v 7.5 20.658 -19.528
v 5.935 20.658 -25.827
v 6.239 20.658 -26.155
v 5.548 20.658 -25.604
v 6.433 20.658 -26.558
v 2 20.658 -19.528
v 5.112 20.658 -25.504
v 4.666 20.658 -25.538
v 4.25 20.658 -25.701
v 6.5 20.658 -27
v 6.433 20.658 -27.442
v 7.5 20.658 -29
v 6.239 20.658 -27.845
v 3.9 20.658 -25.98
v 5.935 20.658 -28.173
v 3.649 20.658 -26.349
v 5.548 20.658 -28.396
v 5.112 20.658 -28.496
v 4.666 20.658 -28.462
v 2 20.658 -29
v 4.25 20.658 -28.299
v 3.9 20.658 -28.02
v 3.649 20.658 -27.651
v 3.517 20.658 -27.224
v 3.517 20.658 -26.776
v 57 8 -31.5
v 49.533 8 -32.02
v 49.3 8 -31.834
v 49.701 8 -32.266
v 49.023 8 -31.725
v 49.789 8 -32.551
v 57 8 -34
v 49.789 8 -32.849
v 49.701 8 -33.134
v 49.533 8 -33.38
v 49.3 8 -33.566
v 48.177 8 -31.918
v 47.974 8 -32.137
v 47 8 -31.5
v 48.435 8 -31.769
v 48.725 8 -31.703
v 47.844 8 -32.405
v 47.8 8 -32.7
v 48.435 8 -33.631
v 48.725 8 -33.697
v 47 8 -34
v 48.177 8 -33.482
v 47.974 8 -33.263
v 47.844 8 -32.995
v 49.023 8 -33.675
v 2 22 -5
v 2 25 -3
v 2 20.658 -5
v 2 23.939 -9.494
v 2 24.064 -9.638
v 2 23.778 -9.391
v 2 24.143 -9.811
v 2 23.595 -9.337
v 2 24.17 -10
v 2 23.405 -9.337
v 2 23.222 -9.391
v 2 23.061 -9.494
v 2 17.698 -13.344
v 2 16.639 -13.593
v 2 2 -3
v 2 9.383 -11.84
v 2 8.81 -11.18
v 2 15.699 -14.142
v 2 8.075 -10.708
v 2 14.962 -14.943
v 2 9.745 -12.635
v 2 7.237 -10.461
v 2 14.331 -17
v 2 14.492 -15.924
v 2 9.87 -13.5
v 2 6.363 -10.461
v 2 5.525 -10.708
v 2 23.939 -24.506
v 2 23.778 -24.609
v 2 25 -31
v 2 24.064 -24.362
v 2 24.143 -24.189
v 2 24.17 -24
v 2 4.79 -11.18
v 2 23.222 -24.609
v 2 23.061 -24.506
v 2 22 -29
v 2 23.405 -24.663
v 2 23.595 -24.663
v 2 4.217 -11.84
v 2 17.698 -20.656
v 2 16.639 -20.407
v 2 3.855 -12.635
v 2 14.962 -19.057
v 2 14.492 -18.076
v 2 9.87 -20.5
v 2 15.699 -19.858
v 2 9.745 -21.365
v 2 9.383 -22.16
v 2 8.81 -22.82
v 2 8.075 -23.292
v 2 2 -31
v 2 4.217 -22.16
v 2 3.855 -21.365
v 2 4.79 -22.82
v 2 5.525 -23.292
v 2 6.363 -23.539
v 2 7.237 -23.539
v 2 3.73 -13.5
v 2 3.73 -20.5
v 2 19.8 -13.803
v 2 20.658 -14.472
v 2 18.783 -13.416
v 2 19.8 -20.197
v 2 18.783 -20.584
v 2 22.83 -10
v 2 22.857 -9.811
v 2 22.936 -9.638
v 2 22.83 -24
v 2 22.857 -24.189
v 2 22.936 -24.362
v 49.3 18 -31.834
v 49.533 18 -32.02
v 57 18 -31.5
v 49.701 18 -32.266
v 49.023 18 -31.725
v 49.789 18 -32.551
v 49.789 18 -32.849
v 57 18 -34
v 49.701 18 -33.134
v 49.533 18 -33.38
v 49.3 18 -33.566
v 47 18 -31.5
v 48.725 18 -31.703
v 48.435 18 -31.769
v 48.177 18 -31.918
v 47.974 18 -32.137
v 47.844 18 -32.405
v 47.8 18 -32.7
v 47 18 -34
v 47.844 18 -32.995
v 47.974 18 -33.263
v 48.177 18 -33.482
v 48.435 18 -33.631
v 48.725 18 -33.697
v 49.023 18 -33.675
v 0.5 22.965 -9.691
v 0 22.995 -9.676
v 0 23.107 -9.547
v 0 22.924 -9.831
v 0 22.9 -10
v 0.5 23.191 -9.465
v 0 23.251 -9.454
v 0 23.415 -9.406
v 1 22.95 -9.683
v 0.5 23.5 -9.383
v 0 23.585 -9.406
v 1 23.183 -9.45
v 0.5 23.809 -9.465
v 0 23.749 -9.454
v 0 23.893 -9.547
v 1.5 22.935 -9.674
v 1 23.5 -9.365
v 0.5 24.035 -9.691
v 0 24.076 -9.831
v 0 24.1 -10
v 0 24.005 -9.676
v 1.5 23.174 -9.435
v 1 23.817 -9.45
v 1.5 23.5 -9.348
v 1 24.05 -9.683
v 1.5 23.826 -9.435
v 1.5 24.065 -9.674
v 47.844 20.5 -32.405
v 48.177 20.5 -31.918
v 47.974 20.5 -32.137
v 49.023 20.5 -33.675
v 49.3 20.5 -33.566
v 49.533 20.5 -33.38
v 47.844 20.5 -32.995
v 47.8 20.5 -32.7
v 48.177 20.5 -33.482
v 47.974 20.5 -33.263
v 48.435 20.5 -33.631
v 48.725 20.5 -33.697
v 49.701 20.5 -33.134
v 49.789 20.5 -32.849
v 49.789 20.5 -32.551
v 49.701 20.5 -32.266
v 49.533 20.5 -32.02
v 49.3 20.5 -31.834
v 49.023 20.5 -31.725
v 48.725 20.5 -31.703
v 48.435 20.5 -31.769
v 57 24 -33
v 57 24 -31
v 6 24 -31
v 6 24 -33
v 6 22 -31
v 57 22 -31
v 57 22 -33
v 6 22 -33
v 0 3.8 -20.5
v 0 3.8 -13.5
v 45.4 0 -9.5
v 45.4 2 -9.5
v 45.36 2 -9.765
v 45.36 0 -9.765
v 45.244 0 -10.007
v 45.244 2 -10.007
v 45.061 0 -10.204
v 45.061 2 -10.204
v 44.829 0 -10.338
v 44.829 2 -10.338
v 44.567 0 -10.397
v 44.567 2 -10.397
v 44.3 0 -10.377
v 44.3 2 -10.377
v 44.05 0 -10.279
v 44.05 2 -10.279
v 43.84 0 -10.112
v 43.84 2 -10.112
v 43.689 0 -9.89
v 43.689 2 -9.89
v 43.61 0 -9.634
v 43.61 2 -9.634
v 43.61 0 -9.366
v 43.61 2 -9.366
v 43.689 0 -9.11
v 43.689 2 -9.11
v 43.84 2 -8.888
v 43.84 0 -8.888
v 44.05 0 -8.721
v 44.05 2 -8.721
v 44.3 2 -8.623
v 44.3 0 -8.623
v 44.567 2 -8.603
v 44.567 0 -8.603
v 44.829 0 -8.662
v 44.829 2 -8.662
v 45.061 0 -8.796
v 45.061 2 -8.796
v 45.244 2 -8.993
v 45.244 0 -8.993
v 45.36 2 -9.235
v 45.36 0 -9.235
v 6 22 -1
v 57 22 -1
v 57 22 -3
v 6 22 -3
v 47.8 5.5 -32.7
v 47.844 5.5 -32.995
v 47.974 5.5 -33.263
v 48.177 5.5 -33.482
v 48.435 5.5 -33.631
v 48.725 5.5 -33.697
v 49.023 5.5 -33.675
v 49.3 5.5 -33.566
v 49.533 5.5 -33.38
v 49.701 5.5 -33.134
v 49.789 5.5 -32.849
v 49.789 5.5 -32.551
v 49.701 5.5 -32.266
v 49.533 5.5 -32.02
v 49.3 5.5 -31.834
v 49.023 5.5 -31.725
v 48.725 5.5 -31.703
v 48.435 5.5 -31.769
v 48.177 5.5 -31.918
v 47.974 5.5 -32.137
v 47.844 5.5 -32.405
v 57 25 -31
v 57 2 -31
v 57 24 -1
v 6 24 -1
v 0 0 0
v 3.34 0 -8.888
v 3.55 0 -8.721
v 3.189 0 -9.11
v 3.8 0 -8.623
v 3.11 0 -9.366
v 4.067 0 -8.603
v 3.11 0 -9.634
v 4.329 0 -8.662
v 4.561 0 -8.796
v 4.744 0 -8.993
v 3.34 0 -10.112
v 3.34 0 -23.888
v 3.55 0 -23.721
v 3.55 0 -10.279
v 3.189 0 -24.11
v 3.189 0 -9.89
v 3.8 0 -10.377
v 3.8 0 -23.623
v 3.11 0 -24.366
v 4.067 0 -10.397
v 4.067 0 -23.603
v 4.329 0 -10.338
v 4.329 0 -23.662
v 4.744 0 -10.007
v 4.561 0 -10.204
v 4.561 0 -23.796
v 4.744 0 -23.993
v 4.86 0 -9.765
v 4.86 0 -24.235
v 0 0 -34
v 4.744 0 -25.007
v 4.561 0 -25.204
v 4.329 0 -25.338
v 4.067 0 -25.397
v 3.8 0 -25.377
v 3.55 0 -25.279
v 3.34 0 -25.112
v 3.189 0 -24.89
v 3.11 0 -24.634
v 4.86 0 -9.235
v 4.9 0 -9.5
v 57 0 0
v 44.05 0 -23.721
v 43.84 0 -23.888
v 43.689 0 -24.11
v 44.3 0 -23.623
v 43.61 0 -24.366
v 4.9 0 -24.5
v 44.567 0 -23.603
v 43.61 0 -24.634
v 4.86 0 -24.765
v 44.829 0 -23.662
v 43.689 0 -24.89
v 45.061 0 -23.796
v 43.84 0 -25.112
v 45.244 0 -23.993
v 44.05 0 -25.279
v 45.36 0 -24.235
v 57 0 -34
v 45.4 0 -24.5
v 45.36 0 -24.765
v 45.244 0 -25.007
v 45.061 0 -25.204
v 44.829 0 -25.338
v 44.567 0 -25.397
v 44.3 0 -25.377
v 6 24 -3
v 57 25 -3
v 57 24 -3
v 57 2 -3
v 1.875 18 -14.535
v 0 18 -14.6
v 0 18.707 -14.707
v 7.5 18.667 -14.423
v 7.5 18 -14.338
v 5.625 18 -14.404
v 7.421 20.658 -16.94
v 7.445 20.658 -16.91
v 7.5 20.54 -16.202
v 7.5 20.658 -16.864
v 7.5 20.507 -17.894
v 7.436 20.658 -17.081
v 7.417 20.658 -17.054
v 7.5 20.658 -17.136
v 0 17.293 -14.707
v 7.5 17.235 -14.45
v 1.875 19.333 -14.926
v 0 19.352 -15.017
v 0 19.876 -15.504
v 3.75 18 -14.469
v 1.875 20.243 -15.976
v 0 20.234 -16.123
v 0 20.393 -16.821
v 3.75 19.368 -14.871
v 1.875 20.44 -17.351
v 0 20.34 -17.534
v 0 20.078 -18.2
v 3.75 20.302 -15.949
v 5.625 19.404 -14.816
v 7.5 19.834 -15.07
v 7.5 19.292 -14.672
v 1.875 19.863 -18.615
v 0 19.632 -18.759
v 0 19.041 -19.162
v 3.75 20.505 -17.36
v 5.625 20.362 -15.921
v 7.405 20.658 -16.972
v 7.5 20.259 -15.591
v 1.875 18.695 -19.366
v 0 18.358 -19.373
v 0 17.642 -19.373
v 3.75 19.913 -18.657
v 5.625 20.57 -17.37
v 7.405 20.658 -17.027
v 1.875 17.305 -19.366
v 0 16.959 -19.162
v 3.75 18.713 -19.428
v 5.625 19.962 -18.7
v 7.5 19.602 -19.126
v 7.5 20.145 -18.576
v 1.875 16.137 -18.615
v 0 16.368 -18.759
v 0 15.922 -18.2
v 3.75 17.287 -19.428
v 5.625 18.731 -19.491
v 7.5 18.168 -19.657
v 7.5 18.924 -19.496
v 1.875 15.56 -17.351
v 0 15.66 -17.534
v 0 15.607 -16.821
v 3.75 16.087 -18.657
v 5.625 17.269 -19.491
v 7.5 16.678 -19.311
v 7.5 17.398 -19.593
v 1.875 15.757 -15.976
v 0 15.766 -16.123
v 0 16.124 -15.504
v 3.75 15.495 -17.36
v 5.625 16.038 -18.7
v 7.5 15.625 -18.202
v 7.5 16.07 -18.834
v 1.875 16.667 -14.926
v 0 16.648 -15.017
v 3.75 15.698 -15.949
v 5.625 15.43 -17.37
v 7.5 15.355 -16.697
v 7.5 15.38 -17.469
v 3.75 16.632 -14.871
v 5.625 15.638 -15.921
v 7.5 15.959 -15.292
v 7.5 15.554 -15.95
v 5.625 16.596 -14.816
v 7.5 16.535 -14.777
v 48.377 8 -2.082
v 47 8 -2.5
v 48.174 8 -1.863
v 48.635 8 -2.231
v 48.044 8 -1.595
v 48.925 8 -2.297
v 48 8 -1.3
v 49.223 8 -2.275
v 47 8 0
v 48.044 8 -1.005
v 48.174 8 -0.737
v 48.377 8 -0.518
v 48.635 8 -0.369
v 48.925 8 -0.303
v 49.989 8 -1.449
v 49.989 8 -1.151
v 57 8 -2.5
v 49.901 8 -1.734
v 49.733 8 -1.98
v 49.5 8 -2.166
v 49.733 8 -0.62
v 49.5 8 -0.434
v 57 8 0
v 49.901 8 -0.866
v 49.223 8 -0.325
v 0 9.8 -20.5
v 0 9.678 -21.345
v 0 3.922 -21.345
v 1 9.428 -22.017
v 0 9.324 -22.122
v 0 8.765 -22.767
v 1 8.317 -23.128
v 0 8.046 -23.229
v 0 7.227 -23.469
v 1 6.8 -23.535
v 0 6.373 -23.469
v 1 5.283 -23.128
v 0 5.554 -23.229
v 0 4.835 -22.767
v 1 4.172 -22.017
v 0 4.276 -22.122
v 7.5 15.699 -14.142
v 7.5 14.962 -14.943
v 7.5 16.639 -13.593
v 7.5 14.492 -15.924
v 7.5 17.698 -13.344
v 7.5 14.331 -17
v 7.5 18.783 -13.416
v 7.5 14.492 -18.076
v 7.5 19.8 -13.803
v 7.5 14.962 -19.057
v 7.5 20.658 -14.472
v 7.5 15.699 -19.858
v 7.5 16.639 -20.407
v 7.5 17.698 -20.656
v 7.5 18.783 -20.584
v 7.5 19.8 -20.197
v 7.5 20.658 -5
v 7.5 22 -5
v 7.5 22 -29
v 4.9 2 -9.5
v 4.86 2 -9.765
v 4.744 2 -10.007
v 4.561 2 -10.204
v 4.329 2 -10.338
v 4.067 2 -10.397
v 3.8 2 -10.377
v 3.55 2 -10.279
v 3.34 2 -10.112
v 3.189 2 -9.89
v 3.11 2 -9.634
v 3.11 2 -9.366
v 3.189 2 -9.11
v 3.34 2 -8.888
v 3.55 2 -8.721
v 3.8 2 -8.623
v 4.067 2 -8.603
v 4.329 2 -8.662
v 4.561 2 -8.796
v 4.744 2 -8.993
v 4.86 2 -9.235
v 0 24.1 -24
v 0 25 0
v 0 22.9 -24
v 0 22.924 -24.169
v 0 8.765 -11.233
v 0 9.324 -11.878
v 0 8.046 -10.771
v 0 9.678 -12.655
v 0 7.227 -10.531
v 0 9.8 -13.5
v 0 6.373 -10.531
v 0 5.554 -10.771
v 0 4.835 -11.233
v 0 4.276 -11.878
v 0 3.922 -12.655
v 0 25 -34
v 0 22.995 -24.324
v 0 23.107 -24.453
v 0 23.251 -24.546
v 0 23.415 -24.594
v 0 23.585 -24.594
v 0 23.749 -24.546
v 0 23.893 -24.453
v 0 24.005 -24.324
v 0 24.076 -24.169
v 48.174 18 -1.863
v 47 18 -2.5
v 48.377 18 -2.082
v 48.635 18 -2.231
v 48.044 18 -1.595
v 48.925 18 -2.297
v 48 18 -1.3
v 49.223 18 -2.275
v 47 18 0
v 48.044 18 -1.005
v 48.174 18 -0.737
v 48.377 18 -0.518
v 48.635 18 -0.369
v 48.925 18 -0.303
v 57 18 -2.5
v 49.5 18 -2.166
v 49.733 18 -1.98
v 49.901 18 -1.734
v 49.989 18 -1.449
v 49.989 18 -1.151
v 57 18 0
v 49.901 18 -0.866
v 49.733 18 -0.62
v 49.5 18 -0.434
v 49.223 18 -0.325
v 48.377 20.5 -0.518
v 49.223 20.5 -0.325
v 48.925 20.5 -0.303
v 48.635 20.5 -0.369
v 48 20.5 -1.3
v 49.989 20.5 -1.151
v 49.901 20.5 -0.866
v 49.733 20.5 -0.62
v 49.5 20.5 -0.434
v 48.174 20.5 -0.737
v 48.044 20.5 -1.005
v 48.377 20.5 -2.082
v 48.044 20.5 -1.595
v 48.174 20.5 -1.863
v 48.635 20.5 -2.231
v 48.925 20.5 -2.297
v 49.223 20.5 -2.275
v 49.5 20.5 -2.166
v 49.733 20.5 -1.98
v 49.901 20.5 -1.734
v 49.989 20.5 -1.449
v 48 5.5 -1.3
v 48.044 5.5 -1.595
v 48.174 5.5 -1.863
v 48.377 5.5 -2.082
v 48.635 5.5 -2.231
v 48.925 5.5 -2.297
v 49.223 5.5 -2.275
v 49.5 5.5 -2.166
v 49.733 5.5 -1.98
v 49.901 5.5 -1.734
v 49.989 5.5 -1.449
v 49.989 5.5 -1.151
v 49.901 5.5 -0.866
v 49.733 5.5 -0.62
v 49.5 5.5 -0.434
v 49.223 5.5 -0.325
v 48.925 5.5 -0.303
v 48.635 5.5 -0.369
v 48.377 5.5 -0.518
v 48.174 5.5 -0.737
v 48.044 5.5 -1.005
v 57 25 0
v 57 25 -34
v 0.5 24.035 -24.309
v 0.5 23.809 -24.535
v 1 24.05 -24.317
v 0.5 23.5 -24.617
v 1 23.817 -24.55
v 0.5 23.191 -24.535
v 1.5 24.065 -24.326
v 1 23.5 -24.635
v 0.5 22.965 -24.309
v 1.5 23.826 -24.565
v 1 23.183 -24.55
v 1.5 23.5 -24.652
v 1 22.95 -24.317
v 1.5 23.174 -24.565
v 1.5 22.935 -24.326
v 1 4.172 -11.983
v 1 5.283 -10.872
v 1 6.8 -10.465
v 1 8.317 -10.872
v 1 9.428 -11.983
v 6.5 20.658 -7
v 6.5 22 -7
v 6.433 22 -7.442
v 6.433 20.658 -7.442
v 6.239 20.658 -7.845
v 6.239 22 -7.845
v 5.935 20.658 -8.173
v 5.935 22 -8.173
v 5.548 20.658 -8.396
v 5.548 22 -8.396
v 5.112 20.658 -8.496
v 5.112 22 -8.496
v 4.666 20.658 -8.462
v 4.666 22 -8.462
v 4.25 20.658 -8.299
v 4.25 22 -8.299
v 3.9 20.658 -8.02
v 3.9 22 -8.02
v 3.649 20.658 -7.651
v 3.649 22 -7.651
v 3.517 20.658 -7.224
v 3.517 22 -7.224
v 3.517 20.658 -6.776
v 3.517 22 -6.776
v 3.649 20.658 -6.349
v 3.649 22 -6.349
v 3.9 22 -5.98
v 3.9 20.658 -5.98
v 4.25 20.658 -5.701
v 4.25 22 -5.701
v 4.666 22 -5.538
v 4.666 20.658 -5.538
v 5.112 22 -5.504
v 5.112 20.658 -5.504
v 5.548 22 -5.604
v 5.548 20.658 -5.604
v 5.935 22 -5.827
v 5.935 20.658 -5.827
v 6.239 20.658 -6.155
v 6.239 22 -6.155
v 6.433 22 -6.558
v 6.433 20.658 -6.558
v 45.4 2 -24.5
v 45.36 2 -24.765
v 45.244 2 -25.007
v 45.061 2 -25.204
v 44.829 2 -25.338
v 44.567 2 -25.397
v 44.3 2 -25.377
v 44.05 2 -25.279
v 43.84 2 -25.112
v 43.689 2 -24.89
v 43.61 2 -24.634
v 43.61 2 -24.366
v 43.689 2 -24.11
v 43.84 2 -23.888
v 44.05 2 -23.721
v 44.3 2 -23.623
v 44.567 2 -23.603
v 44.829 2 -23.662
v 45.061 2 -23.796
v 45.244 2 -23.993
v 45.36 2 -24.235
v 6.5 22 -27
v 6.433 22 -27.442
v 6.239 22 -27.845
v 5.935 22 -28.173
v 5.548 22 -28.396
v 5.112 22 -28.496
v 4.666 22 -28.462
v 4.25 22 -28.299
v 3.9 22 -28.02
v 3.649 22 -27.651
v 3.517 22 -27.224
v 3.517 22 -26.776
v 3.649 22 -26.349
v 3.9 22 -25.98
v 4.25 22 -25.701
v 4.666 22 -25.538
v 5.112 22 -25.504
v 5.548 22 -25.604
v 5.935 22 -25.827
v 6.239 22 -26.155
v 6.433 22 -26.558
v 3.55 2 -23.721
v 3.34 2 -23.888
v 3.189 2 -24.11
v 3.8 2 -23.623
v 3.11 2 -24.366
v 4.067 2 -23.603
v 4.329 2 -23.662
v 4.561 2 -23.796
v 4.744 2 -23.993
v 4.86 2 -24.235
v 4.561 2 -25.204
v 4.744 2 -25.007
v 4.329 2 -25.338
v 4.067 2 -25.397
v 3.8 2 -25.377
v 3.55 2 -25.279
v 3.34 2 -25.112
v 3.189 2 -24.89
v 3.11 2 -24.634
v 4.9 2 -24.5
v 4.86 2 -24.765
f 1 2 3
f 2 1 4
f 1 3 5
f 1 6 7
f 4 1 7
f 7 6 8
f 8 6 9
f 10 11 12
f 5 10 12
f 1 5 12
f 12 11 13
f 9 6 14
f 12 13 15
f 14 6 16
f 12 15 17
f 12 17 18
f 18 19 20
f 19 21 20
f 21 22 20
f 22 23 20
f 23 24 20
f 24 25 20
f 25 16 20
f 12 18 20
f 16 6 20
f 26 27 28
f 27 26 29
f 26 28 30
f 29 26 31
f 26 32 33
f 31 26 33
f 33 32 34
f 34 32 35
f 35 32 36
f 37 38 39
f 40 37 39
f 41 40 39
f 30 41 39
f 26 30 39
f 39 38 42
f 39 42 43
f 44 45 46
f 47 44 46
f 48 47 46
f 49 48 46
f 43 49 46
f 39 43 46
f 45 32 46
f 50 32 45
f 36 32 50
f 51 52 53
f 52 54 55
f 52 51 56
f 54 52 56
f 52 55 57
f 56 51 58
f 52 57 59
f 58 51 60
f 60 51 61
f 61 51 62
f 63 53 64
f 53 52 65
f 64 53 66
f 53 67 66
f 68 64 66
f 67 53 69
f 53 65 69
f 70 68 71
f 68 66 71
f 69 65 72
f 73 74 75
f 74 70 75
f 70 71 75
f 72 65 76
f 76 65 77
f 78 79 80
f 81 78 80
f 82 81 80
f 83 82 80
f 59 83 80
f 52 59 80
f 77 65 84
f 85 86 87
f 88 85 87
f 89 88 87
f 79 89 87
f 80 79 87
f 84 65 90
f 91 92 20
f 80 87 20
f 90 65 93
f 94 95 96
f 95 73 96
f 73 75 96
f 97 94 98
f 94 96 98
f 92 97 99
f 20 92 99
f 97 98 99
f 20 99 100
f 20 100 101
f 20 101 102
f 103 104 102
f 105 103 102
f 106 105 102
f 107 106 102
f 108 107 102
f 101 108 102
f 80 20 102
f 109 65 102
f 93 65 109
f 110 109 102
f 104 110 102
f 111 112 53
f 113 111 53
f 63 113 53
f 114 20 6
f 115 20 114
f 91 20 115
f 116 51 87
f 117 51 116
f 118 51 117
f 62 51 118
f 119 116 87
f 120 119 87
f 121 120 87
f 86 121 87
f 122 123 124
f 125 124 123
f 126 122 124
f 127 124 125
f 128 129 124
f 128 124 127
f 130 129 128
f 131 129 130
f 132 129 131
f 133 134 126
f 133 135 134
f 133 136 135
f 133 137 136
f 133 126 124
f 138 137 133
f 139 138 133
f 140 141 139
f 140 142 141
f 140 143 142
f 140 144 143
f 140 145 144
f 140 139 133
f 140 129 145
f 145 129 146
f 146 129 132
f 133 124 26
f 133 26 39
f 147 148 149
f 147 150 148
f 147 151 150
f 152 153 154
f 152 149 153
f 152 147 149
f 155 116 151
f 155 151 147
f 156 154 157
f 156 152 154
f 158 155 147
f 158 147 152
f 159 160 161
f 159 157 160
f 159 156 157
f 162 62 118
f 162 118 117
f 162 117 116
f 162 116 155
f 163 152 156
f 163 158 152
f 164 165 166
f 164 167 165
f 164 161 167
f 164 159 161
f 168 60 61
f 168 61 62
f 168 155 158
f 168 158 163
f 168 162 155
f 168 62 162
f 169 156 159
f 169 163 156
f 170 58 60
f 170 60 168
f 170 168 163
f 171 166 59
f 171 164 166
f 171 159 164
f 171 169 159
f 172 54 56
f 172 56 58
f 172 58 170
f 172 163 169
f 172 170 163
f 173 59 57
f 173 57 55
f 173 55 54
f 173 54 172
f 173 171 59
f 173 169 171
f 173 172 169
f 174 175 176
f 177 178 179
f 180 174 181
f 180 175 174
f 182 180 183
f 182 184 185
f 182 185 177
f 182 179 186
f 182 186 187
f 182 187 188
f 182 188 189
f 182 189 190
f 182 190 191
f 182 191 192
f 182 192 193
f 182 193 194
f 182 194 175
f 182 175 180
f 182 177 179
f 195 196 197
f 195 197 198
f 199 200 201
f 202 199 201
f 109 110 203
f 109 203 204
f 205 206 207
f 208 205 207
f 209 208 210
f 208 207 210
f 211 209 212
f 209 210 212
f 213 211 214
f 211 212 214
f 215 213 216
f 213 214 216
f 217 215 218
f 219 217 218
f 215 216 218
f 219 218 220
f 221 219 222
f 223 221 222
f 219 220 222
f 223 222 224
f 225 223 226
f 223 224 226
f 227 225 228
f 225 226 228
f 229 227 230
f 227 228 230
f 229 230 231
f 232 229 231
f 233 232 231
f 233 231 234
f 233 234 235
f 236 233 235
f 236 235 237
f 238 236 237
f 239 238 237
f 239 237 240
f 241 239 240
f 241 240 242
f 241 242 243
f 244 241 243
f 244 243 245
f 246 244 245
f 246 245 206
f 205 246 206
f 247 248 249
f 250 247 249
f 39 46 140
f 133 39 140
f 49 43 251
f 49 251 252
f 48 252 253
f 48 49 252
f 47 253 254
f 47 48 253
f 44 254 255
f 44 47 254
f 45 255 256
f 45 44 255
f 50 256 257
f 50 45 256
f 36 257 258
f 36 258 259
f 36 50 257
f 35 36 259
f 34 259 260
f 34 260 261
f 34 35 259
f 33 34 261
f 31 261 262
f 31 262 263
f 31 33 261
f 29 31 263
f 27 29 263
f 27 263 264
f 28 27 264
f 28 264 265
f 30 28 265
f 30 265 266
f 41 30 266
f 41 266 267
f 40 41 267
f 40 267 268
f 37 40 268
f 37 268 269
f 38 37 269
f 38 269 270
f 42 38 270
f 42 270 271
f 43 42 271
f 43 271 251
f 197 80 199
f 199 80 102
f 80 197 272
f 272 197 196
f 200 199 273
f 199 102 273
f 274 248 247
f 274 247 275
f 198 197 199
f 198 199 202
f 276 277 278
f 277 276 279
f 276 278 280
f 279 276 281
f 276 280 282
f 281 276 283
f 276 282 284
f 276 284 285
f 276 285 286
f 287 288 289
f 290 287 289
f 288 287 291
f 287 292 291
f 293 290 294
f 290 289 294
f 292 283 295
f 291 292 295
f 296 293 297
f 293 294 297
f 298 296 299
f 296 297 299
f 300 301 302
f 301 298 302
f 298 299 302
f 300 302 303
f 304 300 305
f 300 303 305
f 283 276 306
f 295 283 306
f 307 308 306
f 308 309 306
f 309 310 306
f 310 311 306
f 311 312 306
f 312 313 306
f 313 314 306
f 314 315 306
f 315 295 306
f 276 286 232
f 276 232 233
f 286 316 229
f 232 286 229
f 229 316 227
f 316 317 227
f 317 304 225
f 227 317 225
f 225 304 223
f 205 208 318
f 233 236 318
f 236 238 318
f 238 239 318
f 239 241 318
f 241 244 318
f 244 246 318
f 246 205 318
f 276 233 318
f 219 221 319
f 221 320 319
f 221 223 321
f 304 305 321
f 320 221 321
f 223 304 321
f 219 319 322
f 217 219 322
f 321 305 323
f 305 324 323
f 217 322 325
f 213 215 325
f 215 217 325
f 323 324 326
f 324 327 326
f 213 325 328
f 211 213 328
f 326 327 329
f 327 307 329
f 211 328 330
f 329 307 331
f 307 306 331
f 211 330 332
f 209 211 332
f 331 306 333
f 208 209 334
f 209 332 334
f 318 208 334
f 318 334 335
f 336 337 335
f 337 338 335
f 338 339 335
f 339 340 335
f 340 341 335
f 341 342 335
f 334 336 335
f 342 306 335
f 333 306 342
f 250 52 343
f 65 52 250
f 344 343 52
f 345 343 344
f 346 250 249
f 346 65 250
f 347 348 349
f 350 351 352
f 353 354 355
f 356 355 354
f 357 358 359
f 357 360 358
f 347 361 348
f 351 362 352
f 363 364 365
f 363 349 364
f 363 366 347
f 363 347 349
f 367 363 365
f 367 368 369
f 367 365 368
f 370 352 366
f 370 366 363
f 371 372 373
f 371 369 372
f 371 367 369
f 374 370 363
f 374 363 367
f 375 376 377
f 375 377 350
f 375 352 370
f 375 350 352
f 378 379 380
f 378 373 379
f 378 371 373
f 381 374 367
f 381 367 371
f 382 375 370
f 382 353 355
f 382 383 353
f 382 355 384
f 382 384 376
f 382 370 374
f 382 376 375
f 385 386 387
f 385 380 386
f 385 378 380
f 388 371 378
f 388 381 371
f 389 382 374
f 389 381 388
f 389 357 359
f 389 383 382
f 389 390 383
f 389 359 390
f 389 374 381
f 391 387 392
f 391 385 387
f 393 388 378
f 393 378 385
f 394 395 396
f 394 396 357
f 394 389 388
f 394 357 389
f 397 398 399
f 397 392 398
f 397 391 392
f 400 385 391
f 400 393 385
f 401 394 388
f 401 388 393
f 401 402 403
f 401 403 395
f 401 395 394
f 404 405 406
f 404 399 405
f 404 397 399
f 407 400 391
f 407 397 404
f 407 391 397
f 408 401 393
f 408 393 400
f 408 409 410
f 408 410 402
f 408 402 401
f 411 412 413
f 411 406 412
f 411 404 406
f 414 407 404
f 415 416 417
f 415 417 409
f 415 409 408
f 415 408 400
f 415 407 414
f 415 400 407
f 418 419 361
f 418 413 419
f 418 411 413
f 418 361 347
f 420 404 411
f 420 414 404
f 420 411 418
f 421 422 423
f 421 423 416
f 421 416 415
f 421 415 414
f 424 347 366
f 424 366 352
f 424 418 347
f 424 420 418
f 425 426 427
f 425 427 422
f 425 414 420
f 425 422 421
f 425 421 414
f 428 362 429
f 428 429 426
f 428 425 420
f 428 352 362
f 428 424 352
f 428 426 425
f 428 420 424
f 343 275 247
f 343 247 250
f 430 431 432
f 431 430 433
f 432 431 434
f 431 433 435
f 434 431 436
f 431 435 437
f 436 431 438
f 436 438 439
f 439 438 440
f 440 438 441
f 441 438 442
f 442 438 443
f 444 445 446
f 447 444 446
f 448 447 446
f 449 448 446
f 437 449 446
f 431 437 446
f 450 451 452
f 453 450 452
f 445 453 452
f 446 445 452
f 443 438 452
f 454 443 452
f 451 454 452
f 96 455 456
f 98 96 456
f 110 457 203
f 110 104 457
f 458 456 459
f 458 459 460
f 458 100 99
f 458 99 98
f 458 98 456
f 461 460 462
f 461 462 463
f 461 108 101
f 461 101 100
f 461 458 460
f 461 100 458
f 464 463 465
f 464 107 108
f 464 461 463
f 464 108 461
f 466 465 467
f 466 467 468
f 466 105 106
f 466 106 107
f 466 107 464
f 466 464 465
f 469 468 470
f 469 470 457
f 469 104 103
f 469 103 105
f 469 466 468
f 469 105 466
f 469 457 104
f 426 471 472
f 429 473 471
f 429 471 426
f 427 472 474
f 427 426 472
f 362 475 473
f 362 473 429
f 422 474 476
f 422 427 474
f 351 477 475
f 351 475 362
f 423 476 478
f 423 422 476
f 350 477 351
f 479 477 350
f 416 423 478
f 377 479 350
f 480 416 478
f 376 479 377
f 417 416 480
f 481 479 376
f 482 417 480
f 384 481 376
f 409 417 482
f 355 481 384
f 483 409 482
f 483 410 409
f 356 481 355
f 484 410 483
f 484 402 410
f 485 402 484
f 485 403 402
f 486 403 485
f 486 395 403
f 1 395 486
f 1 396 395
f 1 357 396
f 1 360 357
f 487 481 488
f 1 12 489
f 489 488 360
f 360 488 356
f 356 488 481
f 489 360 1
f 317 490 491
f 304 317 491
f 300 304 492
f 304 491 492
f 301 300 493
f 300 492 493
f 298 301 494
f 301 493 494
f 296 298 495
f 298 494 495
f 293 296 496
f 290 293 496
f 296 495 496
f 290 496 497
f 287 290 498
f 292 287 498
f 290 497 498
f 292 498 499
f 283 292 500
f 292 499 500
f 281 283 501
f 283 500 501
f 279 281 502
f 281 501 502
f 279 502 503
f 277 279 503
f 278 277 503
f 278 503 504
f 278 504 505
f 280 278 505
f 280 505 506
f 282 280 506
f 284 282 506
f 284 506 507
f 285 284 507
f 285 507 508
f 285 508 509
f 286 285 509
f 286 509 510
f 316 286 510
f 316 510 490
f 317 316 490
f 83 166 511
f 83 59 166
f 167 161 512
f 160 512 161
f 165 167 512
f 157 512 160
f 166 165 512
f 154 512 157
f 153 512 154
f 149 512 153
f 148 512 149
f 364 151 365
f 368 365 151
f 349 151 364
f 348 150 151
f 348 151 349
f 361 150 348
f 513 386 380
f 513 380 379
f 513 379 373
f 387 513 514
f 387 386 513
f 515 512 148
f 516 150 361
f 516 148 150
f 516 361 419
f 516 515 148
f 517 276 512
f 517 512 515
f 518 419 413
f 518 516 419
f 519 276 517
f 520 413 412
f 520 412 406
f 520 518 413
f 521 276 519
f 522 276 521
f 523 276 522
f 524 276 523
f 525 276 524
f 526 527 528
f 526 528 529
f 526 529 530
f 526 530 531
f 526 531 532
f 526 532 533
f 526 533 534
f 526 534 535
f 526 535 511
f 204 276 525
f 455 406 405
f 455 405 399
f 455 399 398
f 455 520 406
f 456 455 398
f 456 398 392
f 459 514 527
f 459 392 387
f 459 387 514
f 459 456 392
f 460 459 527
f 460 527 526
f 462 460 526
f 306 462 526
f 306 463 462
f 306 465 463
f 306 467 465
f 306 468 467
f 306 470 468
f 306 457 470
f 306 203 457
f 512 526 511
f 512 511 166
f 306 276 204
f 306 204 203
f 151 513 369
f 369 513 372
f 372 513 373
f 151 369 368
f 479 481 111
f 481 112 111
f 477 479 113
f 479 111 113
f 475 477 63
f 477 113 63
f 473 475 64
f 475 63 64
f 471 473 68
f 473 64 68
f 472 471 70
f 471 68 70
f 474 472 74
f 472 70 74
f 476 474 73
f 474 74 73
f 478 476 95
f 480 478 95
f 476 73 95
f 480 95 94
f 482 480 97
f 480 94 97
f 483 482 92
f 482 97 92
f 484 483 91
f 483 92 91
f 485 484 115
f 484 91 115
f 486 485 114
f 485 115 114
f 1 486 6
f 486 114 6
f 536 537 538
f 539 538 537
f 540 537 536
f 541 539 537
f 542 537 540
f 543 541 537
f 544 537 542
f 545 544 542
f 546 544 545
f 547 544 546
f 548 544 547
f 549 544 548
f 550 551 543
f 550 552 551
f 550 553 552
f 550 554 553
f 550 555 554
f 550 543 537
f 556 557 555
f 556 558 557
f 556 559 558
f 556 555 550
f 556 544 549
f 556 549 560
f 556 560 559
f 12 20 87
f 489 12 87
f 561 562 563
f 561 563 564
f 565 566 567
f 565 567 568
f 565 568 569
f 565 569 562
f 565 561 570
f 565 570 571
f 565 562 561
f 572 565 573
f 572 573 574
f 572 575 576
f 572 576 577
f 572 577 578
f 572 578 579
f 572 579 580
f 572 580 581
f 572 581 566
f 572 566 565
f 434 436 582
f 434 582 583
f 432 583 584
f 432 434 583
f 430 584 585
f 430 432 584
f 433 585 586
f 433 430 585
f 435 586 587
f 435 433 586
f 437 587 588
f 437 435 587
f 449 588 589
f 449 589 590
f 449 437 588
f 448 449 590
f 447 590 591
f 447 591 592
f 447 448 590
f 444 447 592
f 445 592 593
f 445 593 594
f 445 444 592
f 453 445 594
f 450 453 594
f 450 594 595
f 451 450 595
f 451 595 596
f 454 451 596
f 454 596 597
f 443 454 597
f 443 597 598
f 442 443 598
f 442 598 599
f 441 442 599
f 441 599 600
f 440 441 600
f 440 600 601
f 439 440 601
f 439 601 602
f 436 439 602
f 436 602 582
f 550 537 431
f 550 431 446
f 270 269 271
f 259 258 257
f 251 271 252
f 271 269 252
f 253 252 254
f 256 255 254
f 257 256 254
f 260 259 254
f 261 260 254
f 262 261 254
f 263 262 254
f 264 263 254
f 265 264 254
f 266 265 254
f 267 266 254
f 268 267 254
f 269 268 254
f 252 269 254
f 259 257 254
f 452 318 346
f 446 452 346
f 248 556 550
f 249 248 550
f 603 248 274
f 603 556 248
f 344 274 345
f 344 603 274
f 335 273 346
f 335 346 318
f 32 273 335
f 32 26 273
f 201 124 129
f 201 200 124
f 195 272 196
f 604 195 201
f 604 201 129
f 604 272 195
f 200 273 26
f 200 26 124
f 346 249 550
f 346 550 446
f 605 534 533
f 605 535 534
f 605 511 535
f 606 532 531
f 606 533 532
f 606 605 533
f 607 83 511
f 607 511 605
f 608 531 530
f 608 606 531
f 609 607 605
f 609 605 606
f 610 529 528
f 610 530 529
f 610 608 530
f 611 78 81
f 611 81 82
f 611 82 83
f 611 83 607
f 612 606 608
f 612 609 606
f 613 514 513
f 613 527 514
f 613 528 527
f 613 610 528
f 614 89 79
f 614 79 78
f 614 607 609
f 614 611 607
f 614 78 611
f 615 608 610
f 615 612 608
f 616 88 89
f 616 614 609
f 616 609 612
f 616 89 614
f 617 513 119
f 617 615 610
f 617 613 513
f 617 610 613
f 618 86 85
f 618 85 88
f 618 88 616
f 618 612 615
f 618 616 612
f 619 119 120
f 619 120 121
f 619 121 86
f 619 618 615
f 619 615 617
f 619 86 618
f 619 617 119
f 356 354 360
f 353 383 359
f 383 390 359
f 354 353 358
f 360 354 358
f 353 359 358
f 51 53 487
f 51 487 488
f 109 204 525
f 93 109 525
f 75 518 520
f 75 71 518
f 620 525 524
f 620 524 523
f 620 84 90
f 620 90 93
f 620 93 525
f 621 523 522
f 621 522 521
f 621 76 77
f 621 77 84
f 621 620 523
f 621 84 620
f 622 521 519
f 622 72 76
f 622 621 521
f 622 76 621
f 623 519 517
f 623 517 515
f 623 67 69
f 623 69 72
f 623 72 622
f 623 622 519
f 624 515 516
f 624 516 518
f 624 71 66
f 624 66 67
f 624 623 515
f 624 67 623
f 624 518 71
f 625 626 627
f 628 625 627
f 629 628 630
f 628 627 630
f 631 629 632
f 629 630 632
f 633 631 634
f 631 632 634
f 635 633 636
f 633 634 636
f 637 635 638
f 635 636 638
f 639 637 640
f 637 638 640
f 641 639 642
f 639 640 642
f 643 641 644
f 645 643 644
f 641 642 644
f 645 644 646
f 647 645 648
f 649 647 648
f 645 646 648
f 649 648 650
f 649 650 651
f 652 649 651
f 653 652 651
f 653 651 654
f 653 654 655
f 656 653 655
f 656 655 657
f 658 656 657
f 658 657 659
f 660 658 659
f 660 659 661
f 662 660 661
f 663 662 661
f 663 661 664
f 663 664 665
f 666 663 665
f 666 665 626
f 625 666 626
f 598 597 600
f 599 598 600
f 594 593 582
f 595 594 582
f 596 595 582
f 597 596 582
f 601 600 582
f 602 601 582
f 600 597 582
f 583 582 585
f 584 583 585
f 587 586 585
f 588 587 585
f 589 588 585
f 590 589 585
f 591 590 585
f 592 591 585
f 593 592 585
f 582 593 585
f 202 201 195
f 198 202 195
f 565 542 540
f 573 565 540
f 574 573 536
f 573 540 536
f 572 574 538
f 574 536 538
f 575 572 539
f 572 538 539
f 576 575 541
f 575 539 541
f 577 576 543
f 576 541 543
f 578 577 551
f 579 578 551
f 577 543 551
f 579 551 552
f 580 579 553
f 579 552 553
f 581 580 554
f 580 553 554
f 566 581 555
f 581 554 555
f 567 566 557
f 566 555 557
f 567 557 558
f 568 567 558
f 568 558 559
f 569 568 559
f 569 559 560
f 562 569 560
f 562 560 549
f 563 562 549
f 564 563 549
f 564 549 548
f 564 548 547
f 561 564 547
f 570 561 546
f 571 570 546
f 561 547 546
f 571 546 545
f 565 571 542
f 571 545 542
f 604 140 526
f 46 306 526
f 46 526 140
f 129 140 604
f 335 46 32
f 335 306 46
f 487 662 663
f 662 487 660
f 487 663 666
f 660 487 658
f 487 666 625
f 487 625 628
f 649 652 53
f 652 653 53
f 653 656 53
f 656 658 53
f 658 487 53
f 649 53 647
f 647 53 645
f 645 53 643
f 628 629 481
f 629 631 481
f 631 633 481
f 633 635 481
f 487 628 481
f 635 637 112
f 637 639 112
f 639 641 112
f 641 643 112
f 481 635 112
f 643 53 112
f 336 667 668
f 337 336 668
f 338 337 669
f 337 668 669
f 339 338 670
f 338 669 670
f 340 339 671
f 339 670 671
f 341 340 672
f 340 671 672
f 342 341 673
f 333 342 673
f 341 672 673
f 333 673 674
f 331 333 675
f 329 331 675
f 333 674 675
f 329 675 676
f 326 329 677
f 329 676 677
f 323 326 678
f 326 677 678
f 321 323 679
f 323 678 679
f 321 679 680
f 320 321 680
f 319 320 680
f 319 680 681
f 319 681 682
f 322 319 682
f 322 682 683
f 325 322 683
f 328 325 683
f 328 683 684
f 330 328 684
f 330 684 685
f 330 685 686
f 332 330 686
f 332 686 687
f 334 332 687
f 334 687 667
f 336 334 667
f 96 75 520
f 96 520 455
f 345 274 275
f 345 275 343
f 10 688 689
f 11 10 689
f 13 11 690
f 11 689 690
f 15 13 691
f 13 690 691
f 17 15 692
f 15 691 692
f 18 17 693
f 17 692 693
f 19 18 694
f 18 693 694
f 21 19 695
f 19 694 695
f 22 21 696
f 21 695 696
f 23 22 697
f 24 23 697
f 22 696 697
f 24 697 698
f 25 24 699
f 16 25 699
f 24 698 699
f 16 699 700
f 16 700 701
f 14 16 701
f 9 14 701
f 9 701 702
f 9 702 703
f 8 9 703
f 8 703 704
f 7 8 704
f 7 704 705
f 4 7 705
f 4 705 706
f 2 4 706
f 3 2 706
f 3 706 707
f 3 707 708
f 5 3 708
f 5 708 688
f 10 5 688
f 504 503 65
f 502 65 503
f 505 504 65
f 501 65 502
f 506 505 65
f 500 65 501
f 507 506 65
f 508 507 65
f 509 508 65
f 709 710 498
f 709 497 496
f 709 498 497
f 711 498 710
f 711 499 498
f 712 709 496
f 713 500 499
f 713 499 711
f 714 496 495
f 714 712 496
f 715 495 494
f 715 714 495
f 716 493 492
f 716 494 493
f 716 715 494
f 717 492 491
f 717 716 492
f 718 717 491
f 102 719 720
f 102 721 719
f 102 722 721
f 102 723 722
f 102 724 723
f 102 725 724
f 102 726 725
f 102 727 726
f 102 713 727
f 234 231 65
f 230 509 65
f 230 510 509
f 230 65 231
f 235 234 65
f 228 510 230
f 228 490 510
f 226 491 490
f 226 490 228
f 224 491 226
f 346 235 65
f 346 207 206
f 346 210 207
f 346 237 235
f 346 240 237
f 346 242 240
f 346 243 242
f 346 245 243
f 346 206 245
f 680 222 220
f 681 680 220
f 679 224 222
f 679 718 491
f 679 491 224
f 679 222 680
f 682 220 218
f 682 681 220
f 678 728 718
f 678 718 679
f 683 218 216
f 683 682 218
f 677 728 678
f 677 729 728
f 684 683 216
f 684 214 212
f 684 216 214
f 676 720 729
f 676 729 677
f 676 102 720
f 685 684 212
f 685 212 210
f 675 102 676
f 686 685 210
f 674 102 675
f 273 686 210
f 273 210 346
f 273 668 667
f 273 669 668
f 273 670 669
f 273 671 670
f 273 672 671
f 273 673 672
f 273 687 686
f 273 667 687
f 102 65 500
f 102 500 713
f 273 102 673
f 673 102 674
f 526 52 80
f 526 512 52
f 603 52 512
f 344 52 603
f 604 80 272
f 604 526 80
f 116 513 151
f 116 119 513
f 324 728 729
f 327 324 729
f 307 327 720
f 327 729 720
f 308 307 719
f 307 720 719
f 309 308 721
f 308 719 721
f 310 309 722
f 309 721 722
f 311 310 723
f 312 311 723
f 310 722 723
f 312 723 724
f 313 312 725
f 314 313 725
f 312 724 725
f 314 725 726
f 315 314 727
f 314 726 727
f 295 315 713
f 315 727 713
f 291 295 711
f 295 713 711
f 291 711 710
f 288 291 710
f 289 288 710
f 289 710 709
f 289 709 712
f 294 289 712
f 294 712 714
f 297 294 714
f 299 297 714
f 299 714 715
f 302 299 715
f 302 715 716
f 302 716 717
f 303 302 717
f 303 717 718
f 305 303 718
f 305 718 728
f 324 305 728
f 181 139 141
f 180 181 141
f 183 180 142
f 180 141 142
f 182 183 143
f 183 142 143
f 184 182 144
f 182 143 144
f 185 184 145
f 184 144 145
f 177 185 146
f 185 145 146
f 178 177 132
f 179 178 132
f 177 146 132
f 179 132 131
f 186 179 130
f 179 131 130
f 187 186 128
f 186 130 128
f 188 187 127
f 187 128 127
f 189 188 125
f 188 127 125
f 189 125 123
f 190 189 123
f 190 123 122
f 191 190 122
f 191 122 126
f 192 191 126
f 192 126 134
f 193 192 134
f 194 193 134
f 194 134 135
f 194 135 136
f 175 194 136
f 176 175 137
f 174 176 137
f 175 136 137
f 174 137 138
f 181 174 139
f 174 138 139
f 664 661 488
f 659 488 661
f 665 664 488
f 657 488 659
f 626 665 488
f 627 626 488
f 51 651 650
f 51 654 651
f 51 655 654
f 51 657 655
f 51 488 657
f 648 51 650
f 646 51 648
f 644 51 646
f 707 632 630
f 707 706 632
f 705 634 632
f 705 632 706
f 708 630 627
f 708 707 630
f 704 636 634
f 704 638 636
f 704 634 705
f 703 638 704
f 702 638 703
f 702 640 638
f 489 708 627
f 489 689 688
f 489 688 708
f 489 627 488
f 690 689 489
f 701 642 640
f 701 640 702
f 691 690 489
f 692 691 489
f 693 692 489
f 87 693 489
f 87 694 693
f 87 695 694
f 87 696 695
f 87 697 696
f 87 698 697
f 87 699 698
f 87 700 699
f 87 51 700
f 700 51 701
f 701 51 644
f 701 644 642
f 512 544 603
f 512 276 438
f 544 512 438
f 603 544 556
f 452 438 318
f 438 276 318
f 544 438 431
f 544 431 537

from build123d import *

# Parameters (mm, degrees)
SKETCH1_W                    = 59
SKETCH1_H                    = 34
SKETCH1_W_2                  = 55
SKETCH1_H_2                  = 28
BOSS_EXTRUDE1_DEPTH          = 25
SKETCH1_2_W                  = 55
SKETCH1_2_H                  = 28
BOSS_EXTRUDE2_DEPTH          = 2
SKETCH2_W                    = 2
SKETCH2_H                    = 34
CUT_EXTRUDE1_DEPTH           = 25
SKETCH3_R                    = 0.9
CUT_EXTRUDE2_DEPTH           = 25
CUT_EXTRUDE3_DEPTH           = 25
SKETCH5_W                    = 2
SKETCH5_H                    = 2
CUT_EXTRUDE4_DEPTH           = 51
SKETCH6_R                    = 3.668845882
BOSS_EXTRUDE3_DEPTH          = 5.5
SKETCH4_3_R                  = 2.4
CUT_EXTRUDE5_DEPTH           = 8
CUT_EXTRUDE5_DRAFT           = 2
CUT_EXTRUDE5_PROFILE_2_DEPTH = 8
CUT_EXTRUDE5_PROFILE_2_DRAFT = 2
CUT_EXTRUDE5_PROFILE_3_DEPTH = 8
CUT_EXTRUDE5_PROFILE_3_DRAFT = 2
SKETCH7_W                    = 24
SKETCH7_H                    = 1.341552338
BOSS_EXTRUDE4_DEPTH          = 5.5
SKETCH8_R                    = 1.5
CUT_EXTRUDE6_DEPTH           = 5.5
SKETCH9_W                    = 10
SKETCH9_H                    = 10
CUT_EXTRUDE7_DEPTH           = 2.5
SKETCH10_W                   = 10
SKETCH10_H                   = 10
CUT_EXTRUDE8_DEPTH           = 2.5
CUT_EXTRUDE9_DEPTH           = 12.5
CUT_EXTRUDE9_DEPTH_BACK      = 2.5
SKETCH11_R                   = 1
CUT_EXTRUDE10_DEPTH          = 12.5
CUT_EXTRUDE10_DEPTH_BACK     = 2.5
SKETCH12_R                   = 1


with BuildPart() as part:
    # Sketch1 → Boss-Extrude1 (new body)
    with BuildSketch(Plane(origin=(0, 0, 0), x_dir=(1, 0, 0), z_dir=(0, 1, 0))):
        with Locations((29.5, 17)):
            Rectangle(SKETCH1_W, SKETCH1_H)
        with Locations((29.5, 17)):
            Rectangle(SKETCH1_W_2, SKETCH1_H_2, mode=Mode.SUBTRACT)
    extrude(amount=BOSS_EXTRUDE1_DEPTH)

    # Sketch1<2> → Boss-Extrude2 (add)
    with BuildSketch(Plane(origin=(0, 0, 0), x_dir=(1, 0, 0), z_dir=(0, 1, 0))):
        with Locations((29.5, 17)):
            Rectangle(SKETCH1_2_W, SKETCH1_2_H)
    extrude(amount=BOSS_EXTRUDE2_DEPTH)

    # Sketch2 → Cut-Extrude1 (cut)
    with BuildSketch(Plane(origin=(0, 25, 0), x_dir=(1, 0, 0), z_dir=(0, 1, 0))):
        with Locations((58, 17)):
            Rectangle(SKETCH2_W, SKETCH2_H)
    extrude(amount=-CUT_EXTRUDE1_DEPTH, mode=Mode.SUBTRACT)

    # Sketch3 → Cut-Extrude2 (cut)
    with BuildSketch(Plane(origin=(0, 2, 0), x_dir=(1, 0, 0), z_dir=(0, 1, 0))):
        with Locations((4, 9.5)):
            Circle(SKETCH3_R)
        with Locations((4, 24.5)):
            Circle(SKETCH3_R)
        with Locations((44.5, 9.5)):
            Circle(SKETCH3_R)
        with Locations((44.5, 24.5)):
            Circle(SKETCH3_R)
    extrude(amount=-CUT_EXTRUDE2_DEPTH, mode=Mode.SUBTRACT)

    # Sketch4 → Cut-Extrude3 (cut)
    with BuildSketch(Plane.ZY):
        with BuildLine():
            Line((-13.5, 9.8), (-20.5, 9.8))
            ThreePointArc((-20.5, 9.8), (-23.5, 6.8), (-20.5, 3.8))
            Line((-20.5, 3.8), (-13.5, 3.8))
            ThreePointArc((-13.5, 3.8), (-10.5, 6.8), (-13.5, 9.8))
        make_face()
        with BuildLine():
            Line((-10, 24.1), (-24, 24.1))
            ThreePointArc((-24, 24.1), (-24.6, 23.5), (-24, 22.9))
            Line((-24, 22.9), (-10, 22.9))
            ThreePointArc((-10, 22.9), (-9.4, 23.5), (-10, 24.1))
        make_face()
    extrude(amount=-CUT_EXTRUDE3_DEPTH, mode=Mode.SUBTRACT)

    # Sketch5 → Cut-Extrude4 (cut)
    with BuildSketch(Plane(origin=(57, 0, 0), x_dir=(0, 0, -1), z_dir=(1, 0, 0))):
        with Locations((2, 23)):
            Rectangle(SKETCH5_W, SKETCH5_H)
        with Locations((32, 23)):
            Rectangle(SKETCH5_W, SKETCH5_H)
    extrude(amount=-CUT_EXTRUDE4_DEPTH, mode=Mode.SUBTRACT)

    # Sketch6 → Boss-Extrude3 (add)
    with BuildSketch(Plane(origin=(2, 0, 0), x_dir=(0, 0, -1), z_dir=(1, 0, 0))):
        with Locations((17, 18)):
            Circle(SKETCH6_R)
    extrude(amount=BOSS_EXTRUDE3_DEPTH)


with BuildPart() as cut_extrude5_tool:
    # Sketch4<3> → Cut-Extrude5 (with draft: the straight prism first)
    with BuildSketch(Plane.ZY):
        with Locations((-17, 18)):
            Circle(SKETCH4_3_R)
    extrude(amount=-CUT_EXTRUDE5_DEPTH)
    # Cut-Extrude5: the draft: its side faces are tilted about the plane it starts from
    cut_extrude5_sides = [cut_extrude5_tool.faces().sort_by_distance(p)[0] for p in [
        (4, 18, -19.4),
    ]]
    draft(cut_extrude5_sides, Plane.ZY, CUT_EXTRUDE5_DRAFT)


with BuildPart() as part_1:
    add(part.part)

    # Cut-Extrude5: cut by cut_extrude5_tool
    add(cut_extrude5_tool.part, mode=Mode.SUBTRACT)


with BuildPart() as cut_extrude5_profile_2_tool:
    # Sketch4<3> → Cut-Extrude5 profile 2 (with draft: the straight prism first)
    with BuildSketch(Plane.ZY):
        with BuildLine():
            ThreePointArc((-20.5, 9.8), (-23.5, 6.8), (-20.5, 3.8))
            Line((-20.5, 3.8), (-13.5, 3.8))
            ThreePointArc((-13.5, 3.8), (-10.5, 6.8), (-13.5, 9.8))
            Line((-13.5, 9.8), (-20.5, 9.8))
        make_face()
    extrude(amount=-CUT_EXTRUDE5_PROFILE_2_DEPTH)
    # Cut-Extrude5 profile 2: the draft: its side faces are tilted about the plane it starts from
    cut_extrude5_profile_2_sides = [cut_extrude5_profile_2_tool.faces().sort_by_distance(p)[0] for p in [
        (4, 3.8, -17),
        (4, 6.8, -10.5),
        (4, 9.8, -17),
        (4, 6.8, -23.5),
    ]]
    draft(cut_extrude5_profile_2_sides, Plane.ZY, CUT_EXTRUDE5_PROFILE_2_DRAFT)


with BuildPart() as part_2:
    add(part_1.part)

    # Cut-Extrude5 profile 2: cut by cut_extrude5_profile_2_tool
    add(cut_extrude5_profile_2_tool.part, mode=Mode.SUBTRACT)


with BuildPart() as cut_extrude5_profile_3_tool:
    # Sketch4<3> → Cut-Extrude5 profile 3 (with draft: the straight prism first)
    with BuildSketch(Plane.ZY):
        with BuildLine():
            ThreePointArc((-24, 24.1), (-24.6, 23.5), (-24, 22.9))
            Line((-24, 22.9), (-10, 22.9))
            ThreePointArc((-10, 22.9), (-9.4, 23.5), (-10, 24.1))
            Line((-10, 24.1), (-24, 24.1))
        make_face()
    extrude(amount=-CUT_EXTRUDE5_PROFILE_3_DEPTH)
    # Cut-Extrude5 profile 3: the draft: its side faces are tilted about the plane it starts from
    cut_extrude5_profile_3_sides = [cut_extrude5_profile_3_tool.faces().sort_by_distance(p)[0] for p in [
        (4, 23.5, -24.6),
        (4, 22.9, -17),
        (4, 23.5, -9.4),
        (4, 24.1, -17),
    ]]
    draft(cut_extrude5_profile_3_sides, Plane.ZY, CUT_EXTRUDE5_PROFILE_3_DRAFT)


with BuildPart() as part_3:
    add(part_2.part)

    # Cut-Extrude5 profile 3: cut by cut_extrude5_profile_3_tool
    add(cut_extrude5_profile_3_tool.part, mode=Mode.SUBTRACT)

    # Sketch7 → Boss-Extrude4 (add)
    with BuildSketch(Plane(origin=(2, 0, 0), x_dir=(0, 0, -1), z_dir=(1, 0, 0))):
        with Locations((17, 21.329223831)):
            Rectangle(SKETCH7_W, SKETCH7_H)
    extrude(amount=BOSS_EXTRUDE4_DEPTH)

    # Sketch8 → Cut-Extrude6 (cut)
    with BuildSketch(Plane(origin=(0, 22, 0), x_dir=(1, 0, 0), z_dir=(0, 1, 0))):
        with Locations((5, 7)):
            Circle(SKETCH8_R)
        with Locations((5, 27)):
            Circle(SKETCH8_R)
    extrude(amount=-CUT_EXTRUDE6_DEPTH, mode=Mode.SUBTRACT)

    # Sketch9 → Cut-Extrude7 (cut)
    with BuildSketch(Plane(origin=(0, 0, -34), x_dir=(-1, 0, 0), z_dir=(0, 0, -1))):
        with Locations((-52, 13)):
            Rectangle(SKETCH9_W, SKETCH9_H)
    extrude(amount=-CUT_EXTRUDE7_DEPTH, mode=Mode.SUBTRACT)

    # Sketch10 → Cut-Extrude8 (cut)
    with BuildSketch(Plane.XY):
        with Locations((52, 13)):
            Rectangle(SKETCH10_W, SKETCH10_H)
    extrude(amount=-CUT_EXTRUDE8_DEPTH, mode=Mode.SUBTRACT)

    # Sketch11 → Cut-Extrude9 (cut, two sides: drawn at the far end of the back side and taken through both)
    with BuildSketch(Plane(origin=(0, 18, 0), x_dir=(-1, 0, 0), z_dir=(0, -1, 0)).offset(-CUT_EXTRUDE9_DEPTH_BACK)):
        with Locations((-49, 1.3)):
            Circle(SKETCH11_R)
    extrude(amount=CUT_EXTRUDE9_DEPTH + CUT_EXTRUDE9_DEPTH_BACK, mode=Mode.SUBTRACT)

    # Sketch12 → Cut-Extrude10 (cut, two sides: drawn at the far end of the back side and taken through both)
    with BuildSketch(Plane(origin=(0, 18, 0), x_dir=(-1, 0, 0), z_dir=(0, -1, 0)).offset(-CUT_EXTRUDE10_DEPTH_BACK)):
        with Locations((-48.8, 32.7)):
            Circle(SKETCH12_R)
    extrude(amount=CUT_EXTRUDE10_DEPTH + CUT_EXTRUDE10_DEPTH_BACK, mode=Mode.SUBTRACT)


solid = part_3.part
